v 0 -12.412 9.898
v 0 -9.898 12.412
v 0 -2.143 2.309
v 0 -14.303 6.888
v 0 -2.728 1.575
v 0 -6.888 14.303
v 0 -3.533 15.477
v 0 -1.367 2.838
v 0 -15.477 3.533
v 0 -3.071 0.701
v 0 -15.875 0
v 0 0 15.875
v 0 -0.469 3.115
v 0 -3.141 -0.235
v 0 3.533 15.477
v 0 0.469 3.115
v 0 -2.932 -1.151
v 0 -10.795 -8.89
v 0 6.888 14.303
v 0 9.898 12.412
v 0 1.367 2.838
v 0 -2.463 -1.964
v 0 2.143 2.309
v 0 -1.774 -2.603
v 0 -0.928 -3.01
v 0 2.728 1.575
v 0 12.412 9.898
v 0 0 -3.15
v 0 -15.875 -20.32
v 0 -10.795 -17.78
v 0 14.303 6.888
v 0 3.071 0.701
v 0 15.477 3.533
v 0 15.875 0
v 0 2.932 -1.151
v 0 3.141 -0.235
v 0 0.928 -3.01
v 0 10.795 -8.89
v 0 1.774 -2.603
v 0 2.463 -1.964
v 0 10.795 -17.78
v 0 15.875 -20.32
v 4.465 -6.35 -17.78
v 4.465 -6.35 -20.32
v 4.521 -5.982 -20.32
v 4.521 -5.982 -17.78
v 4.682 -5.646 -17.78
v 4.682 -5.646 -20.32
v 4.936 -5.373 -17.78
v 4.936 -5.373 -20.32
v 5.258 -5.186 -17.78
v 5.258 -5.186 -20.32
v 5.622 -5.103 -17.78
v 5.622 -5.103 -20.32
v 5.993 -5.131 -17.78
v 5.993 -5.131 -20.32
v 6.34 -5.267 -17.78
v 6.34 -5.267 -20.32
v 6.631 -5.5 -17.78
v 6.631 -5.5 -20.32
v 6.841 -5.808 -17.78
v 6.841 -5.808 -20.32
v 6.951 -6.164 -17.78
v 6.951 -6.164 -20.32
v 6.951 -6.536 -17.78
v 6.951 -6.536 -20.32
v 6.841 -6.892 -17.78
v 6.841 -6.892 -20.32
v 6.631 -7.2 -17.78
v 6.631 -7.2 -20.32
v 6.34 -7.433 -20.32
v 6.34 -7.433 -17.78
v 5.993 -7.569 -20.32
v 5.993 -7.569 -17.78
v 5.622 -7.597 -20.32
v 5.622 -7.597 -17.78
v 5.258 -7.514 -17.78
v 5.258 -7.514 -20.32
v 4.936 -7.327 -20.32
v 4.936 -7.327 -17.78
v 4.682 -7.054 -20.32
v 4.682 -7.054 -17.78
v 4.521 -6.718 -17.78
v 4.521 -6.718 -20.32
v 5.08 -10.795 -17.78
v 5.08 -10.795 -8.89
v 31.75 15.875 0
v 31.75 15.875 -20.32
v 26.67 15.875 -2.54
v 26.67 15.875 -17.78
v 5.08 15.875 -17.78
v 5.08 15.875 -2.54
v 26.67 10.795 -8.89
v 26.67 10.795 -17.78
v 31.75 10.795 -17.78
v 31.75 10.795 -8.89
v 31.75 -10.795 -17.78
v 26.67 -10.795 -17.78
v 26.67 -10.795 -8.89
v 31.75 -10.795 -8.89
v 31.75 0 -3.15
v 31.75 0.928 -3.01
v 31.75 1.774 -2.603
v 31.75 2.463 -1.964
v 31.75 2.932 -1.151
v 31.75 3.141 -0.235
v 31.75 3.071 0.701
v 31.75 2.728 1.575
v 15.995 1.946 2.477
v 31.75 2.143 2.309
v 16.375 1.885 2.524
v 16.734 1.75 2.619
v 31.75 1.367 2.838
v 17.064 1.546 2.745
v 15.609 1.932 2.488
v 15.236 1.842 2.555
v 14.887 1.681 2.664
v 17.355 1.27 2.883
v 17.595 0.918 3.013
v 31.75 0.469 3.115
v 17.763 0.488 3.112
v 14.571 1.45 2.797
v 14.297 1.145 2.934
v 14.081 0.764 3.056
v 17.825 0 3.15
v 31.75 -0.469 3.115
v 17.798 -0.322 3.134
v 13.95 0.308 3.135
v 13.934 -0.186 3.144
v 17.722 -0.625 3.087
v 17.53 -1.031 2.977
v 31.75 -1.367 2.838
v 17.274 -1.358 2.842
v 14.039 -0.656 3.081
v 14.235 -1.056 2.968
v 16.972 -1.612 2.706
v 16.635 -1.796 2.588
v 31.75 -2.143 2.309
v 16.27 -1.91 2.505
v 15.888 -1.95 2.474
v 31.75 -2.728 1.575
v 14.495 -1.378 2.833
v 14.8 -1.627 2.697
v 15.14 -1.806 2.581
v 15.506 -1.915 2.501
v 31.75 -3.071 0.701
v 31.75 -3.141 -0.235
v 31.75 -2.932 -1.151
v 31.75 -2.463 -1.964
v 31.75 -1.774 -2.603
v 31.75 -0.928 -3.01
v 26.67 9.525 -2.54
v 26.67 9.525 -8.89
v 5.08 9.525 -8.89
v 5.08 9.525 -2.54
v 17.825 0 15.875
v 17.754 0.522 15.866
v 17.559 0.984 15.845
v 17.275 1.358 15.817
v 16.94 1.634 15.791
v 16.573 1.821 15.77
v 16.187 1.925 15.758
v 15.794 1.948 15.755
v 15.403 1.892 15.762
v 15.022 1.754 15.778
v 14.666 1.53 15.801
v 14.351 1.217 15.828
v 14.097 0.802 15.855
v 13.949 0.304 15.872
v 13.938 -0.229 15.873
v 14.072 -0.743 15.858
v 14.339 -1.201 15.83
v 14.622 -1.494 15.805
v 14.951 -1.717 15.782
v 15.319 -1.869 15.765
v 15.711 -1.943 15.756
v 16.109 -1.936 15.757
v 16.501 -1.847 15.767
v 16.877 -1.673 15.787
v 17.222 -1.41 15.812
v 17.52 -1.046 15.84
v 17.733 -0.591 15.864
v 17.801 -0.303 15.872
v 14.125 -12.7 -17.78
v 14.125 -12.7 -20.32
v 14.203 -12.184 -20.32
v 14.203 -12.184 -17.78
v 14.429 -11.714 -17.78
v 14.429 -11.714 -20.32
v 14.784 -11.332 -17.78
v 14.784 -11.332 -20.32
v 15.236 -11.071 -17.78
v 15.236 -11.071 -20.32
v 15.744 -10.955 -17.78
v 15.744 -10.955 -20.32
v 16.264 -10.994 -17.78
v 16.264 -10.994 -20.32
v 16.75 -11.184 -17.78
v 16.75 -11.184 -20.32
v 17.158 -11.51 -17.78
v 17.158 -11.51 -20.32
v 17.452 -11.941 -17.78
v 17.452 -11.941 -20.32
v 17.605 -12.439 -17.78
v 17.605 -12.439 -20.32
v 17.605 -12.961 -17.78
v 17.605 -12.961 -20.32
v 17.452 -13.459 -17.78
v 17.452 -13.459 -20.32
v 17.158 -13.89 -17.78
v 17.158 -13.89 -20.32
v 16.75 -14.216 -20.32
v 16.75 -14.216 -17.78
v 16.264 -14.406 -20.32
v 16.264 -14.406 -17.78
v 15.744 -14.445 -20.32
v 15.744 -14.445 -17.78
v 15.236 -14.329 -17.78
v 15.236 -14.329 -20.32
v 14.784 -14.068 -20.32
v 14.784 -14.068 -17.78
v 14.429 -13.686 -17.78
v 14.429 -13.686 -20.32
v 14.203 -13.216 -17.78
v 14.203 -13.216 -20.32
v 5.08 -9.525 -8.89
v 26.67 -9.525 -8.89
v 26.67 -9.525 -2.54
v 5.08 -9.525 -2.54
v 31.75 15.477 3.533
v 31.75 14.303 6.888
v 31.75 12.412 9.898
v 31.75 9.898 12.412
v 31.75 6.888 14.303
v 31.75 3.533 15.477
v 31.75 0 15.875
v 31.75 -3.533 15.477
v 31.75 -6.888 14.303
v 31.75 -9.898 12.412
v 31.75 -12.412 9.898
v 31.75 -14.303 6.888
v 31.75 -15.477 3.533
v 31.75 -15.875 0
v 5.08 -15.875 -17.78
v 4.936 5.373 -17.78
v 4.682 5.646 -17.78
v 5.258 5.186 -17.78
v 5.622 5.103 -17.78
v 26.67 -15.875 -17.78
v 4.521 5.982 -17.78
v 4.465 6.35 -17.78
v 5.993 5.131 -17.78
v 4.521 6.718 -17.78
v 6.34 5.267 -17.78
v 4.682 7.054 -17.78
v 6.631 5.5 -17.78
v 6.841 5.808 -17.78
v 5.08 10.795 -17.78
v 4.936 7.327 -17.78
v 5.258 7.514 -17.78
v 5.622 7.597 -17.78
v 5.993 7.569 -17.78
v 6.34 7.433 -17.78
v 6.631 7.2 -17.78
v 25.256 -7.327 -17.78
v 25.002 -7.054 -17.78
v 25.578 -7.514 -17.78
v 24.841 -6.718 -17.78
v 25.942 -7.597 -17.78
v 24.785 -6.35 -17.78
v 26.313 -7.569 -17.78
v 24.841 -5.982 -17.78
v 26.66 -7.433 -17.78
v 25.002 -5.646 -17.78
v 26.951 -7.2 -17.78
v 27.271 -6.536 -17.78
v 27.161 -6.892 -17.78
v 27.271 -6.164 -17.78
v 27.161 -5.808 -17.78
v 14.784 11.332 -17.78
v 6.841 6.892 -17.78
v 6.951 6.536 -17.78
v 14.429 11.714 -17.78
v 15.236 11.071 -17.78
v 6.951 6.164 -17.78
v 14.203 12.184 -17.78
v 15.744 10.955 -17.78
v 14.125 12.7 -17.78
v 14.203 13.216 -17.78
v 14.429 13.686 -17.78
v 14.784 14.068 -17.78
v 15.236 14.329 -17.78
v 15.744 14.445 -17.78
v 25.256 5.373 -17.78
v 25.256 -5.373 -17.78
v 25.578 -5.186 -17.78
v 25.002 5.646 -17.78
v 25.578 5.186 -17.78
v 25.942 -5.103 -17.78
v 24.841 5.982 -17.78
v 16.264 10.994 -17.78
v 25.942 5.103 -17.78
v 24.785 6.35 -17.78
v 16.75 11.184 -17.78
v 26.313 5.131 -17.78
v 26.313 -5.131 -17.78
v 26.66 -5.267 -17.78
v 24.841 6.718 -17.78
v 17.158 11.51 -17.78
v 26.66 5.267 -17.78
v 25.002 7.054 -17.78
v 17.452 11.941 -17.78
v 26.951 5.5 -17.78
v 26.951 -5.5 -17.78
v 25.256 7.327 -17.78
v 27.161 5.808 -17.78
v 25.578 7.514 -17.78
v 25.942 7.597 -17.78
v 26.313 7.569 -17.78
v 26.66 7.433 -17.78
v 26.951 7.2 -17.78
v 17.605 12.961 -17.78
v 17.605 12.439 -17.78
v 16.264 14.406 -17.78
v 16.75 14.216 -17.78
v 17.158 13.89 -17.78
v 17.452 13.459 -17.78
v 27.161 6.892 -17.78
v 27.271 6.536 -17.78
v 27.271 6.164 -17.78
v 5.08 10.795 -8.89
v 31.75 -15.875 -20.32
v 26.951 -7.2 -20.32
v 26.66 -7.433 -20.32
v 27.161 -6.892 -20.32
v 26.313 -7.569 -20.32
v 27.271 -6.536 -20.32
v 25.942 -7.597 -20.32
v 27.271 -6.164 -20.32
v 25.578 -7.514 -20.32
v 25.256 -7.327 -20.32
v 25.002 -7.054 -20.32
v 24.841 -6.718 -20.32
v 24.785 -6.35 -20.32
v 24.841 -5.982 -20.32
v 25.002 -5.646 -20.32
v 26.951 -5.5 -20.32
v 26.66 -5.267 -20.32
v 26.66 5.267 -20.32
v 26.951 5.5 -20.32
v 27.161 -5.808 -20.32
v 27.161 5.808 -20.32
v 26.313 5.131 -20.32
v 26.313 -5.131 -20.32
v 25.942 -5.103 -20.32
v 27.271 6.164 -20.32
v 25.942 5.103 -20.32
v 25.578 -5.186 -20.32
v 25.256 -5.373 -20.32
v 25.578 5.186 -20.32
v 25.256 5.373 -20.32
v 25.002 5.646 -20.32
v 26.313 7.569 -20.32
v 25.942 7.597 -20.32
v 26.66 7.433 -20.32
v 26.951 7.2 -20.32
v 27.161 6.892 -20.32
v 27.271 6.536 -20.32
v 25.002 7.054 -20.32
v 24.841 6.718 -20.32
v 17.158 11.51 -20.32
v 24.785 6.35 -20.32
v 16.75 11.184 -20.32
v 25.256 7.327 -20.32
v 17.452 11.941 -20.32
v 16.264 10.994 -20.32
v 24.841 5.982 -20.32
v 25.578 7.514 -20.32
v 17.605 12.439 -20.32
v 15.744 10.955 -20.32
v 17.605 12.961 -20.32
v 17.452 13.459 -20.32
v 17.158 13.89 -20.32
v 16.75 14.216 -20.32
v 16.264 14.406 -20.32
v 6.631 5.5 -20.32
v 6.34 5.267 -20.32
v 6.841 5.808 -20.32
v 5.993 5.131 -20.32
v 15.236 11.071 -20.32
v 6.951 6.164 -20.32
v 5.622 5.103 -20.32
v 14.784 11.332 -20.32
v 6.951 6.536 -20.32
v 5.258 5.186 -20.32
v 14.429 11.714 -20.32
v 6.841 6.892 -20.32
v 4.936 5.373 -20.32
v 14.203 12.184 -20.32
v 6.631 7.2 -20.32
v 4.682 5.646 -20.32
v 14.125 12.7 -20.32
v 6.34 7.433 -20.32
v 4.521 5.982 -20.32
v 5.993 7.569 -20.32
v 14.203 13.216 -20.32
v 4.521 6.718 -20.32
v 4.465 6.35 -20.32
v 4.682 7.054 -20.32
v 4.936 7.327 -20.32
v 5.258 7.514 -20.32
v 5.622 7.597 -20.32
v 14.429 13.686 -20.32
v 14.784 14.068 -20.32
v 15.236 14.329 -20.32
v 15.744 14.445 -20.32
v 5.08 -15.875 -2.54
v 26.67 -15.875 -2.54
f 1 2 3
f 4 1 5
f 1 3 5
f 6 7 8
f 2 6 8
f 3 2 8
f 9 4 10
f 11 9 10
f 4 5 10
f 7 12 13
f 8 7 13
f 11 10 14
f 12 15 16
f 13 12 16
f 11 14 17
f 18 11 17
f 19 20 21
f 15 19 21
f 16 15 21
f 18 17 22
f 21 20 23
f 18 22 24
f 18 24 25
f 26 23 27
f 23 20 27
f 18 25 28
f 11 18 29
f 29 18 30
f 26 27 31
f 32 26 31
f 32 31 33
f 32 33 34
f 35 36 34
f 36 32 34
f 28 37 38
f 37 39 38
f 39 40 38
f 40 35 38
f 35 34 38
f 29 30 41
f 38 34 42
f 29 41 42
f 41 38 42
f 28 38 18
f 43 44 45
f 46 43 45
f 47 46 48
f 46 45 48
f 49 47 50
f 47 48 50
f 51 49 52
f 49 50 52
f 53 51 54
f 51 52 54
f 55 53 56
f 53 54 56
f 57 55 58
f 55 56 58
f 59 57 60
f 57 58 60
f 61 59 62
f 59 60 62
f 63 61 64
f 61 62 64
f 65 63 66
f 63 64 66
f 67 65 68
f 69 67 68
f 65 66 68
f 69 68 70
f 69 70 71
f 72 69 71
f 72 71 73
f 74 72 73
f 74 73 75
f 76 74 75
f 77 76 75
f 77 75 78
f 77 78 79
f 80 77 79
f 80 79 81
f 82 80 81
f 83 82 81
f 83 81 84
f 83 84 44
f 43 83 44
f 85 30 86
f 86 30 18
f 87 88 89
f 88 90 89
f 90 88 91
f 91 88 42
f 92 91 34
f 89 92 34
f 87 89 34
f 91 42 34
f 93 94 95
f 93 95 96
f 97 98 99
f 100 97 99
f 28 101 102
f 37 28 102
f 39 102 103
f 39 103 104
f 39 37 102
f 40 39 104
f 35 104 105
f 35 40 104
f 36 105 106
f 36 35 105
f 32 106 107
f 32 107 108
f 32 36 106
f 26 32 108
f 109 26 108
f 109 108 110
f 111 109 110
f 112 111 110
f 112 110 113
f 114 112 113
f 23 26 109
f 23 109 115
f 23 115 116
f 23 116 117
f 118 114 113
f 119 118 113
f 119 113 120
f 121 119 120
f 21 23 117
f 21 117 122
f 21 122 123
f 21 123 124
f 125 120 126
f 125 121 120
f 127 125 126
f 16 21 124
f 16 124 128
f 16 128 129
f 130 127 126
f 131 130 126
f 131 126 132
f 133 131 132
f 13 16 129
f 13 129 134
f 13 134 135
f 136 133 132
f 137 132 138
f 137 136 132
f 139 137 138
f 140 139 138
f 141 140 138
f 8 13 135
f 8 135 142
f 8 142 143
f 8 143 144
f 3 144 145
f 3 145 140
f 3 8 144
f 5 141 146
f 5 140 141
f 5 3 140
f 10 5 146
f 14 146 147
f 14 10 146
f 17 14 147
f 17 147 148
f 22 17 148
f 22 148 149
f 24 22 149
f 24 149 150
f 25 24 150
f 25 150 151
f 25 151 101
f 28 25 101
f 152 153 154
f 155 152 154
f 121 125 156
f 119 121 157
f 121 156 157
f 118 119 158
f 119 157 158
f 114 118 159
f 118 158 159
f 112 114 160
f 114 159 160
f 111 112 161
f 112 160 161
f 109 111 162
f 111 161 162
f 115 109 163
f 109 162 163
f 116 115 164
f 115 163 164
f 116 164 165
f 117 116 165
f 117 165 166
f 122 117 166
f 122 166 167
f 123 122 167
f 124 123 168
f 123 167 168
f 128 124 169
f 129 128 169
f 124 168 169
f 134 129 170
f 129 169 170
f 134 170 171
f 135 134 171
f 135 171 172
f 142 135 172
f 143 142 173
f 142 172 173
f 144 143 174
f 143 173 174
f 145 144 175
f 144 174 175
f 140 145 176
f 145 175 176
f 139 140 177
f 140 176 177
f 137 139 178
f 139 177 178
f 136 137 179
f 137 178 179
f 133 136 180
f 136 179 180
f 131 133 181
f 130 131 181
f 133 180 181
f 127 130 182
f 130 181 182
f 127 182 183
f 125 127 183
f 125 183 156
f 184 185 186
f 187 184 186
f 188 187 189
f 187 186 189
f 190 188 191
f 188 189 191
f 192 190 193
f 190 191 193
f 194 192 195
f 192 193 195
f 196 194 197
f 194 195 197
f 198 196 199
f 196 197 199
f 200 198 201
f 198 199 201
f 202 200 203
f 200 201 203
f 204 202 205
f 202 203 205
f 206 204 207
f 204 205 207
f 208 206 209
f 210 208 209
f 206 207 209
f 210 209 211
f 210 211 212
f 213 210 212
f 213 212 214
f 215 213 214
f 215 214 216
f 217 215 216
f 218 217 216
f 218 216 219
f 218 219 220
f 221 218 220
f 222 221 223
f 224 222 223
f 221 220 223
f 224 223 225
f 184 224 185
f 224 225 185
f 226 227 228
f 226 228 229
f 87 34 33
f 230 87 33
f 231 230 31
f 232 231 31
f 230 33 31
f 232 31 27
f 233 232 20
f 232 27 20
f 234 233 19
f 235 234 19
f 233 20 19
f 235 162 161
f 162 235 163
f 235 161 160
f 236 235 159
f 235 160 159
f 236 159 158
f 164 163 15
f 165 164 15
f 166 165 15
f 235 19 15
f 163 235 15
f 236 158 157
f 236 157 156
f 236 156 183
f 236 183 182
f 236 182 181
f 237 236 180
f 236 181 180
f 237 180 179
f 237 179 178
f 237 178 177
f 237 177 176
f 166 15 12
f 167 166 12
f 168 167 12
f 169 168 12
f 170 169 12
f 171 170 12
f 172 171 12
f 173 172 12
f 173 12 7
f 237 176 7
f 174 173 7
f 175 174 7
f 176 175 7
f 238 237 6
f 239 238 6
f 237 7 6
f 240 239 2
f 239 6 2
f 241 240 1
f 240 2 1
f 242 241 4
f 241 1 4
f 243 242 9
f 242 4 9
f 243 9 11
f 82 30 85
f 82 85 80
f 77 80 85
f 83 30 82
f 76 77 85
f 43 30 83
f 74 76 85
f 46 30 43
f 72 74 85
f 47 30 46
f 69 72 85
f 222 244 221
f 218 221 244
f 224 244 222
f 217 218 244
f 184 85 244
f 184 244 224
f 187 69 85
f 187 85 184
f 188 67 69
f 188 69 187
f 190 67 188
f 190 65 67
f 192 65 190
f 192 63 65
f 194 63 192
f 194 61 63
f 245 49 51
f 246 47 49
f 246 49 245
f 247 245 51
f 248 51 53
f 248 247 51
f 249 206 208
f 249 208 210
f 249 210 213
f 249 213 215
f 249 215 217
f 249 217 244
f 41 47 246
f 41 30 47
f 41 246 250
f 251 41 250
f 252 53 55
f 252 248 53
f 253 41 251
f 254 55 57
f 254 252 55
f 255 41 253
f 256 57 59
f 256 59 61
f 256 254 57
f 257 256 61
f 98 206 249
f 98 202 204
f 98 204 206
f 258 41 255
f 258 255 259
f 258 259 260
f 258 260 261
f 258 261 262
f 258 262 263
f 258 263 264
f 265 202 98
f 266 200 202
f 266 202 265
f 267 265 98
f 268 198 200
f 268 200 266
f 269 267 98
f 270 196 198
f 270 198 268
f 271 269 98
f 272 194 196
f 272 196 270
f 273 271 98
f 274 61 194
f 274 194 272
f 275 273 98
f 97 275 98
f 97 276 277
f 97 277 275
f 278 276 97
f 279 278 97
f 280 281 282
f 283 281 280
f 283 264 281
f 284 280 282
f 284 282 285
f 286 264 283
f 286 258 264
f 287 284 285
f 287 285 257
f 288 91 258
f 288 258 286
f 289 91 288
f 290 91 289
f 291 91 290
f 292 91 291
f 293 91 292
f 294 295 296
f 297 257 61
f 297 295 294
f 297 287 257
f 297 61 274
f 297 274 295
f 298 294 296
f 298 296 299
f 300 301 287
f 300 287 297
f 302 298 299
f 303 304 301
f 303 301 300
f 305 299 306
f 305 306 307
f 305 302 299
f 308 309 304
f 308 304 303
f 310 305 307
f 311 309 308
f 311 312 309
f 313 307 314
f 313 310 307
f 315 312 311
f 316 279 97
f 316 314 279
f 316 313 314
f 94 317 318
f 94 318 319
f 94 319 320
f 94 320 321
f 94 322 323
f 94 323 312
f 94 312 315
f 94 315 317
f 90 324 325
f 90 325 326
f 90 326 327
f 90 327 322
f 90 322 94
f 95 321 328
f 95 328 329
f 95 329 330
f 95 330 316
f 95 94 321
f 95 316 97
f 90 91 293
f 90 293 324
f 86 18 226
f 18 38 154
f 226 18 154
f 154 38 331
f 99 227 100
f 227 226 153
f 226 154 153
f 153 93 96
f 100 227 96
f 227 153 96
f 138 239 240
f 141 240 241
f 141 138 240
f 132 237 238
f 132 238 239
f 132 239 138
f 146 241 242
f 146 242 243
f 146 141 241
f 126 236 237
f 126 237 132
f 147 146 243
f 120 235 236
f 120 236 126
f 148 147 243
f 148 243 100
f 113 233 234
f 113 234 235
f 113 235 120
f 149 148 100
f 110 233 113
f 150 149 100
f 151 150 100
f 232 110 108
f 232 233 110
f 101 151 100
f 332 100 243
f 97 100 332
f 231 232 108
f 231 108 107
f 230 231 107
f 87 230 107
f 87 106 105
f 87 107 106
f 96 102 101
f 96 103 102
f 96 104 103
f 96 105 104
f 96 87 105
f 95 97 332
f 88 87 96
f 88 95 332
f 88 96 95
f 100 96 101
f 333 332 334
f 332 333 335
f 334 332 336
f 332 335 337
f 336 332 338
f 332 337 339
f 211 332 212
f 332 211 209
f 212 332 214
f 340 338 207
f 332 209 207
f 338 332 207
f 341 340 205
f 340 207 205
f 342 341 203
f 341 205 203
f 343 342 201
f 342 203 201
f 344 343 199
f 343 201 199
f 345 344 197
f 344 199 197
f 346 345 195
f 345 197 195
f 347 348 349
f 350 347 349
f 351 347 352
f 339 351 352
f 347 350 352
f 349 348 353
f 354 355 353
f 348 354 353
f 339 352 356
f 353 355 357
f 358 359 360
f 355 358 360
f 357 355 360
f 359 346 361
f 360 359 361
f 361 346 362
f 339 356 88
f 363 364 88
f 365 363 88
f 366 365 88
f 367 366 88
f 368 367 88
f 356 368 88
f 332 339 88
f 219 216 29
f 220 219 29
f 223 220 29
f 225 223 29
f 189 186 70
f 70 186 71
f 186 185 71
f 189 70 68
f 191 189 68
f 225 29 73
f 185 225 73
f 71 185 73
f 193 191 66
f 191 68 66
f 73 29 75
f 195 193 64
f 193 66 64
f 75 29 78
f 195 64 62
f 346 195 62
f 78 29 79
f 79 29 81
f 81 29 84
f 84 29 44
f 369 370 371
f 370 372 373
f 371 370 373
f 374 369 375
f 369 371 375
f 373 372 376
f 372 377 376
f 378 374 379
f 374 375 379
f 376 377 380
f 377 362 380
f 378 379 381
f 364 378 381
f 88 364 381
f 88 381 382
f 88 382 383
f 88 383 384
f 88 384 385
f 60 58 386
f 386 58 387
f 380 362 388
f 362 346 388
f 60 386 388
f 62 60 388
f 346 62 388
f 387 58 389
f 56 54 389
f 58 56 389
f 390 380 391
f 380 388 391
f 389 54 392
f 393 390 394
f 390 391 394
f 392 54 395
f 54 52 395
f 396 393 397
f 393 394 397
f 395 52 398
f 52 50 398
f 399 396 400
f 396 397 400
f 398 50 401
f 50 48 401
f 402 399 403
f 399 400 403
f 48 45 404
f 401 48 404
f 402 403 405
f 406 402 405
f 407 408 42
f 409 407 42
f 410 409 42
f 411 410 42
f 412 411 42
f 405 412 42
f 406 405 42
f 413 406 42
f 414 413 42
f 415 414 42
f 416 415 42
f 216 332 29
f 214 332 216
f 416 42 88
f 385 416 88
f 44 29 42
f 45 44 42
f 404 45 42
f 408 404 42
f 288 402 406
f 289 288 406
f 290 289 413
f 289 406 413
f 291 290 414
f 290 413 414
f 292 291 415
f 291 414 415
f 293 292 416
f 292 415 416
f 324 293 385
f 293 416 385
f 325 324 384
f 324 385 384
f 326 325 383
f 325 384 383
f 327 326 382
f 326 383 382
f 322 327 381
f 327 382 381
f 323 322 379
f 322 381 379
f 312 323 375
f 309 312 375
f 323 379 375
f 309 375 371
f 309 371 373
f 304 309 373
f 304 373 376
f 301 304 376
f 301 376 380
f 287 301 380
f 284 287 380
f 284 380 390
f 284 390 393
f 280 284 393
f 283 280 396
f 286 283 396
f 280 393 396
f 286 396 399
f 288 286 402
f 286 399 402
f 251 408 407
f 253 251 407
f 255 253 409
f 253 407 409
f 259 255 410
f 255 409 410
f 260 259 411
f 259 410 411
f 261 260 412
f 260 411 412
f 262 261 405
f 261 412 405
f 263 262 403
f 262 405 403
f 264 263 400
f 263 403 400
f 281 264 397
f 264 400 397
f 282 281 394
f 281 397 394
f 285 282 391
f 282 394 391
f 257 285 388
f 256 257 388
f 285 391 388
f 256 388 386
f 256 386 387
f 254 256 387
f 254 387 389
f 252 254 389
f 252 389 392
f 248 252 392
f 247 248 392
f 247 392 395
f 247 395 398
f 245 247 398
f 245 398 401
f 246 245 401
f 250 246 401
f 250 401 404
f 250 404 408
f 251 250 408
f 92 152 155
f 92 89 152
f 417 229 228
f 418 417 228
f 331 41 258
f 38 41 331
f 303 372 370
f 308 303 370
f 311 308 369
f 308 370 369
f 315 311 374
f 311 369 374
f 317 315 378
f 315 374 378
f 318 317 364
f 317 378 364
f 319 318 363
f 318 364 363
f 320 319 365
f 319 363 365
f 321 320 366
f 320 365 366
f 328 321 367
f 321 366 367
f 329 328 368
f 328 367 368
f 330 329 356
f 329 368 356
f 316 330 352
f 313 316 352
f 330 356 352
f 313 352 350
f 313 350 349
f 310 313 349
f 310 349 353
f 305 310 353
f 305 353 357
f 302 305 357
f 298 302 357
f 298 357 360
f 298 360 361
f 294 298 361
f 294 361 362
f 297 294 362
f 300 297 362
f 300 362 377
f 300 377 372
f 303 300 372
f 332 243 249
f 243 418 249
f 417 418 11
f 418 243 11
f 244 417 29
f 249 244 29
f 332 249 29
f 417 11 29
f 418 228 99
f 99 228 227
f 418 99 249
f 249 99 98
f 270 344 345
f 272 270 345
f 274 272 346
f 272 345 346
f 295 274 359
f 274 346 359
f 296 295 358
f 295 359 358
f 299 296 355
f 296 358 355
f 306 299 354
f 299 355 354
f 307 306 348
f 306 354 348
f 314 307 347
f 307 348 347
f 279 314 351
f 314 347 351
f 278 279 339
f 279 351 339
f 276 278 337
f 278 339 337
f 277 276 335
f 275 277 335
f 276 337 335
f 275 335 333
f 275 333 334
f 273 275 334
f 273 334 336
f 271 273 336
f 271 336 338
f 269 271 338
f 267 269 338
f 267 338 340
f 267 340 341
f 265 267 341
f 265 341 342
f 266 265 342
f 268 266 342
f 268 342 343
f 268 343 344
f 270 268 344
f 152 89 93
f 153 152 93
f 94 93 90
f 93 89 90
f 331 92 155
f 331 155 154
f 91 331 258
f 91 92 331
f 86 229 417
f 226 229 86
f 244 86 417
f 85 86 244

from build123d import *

# Parameters (mm, degrees)
SKETCH1_R               = 3.15
BOSS_EXTRUDE1_DEPTH     = 31.75
SKETCH4_W               = 8.89
SKETCH4_H               = 21.59
CUT_EXTRUDE1_DEPTH      = 41.902084605
SKETCH2_R               = 1.25
CUT_EXTRUDE2_DEPTH      = 2.54
SKETCH5_W               = 21.59
SKETCH5_H               = 8.89
CUT_EXTRUDE3_DEPTH      = 50.285164096
SKETCH6_R               = 1.75
CUT_EXTRUDE4_DEPTH      = 2.54
CUT_EXTRUDE5_REACH      = 81.487
CUT_EXTRUDE5_END_RADIUS = 3.15
SKETCH7_R               = 1.95
CUT_EXTRUDE6_DEPTH      = 6.35


with BuildPart() as part:
    # Sketch1 → Boss-Extrude1 (new body)
    with BuildSketch(Plane(origin=(0, 0, 0), x_dir=(0, 0, -1), z_dir=(1, 0, 0))):
        with BuildLine():
            Line((20.32, 15.875), (0, 15.875))
            ThreePointArc((0, 15.875), (-15.875, 0), (0, -15.875))
            Line((0, -15.875), (20.32, -15.875))
            Line((20.32, -15.875), (20.32, 15.875))
        make_face()
        Circle(SKETCH1_R, mode=Mode.SUBTRACT)
    extrude(amount=BOSS_EXTRUDE1_DEPTH)

    # Sketch4 → Cut-Extrude1 (cut, through all)
    with BuildSketch(Plane.ZY):
        with Locations((-13.335, 0)):
            Rectangle(SKETCH4_W, SKETCH4_H)
    extrude(amount=-CUT_EXTRUDE1_DEPTH, mode=Mode.SUBTRACT)

    # Sketch2 → Cut-Extrude2 (cut)
    with BuildSketch(Plane(origin=(0, 0, -20.32), x_dir=(-1, 0, 0), z_dir=(0, 0, -1))):
        with Locations((-26.035, 6.35)):
            Circle(SKETCH2_R)
        with Locations((-5.715, 6.35)):
            Circle(SKETCH2_R)
        with Locations((-5.715, -6.35)):
            Circle(SKETCH2_R)
        with Locations((-26.035, -6.35)):
            Circle(SKETCH2_R)
    extrude(amount=-CUT_EXTRUDE2_DEPTH, mode=Mode.SUBTRACT)

    # Sketch5 → Cut-Extrude3 (cut, through all)
    with BuildSketch(Plane(origin=(0, 15.875, 0), x_dir=(1, 0, 0), z_dir=(0, 1, 0))):
        with Locations((15.875, 13.335)):
            Rectangle(SKETCH5_W, SKETCH5_H)
    extrude(amount=-CUT_EXTRUDE3_DEPTH, mode=Mode.SUBTRACT)

    # Sketch6 → Cut-Extrude4 (cut)
    with BuildSketch(Plane(origin=(0, 0, -20.32), x_dir=(-1, 0, 0), z_dir=(0, 0, -1))):
        with Locations((-15.875, 12.7)):
            Circle(SKETCH6_R)
        with Locations((-15.875, -12.7)):
            Circle(SKETCH6_R)
    extrude(amount=-CUT_EXTRUDE4_DEPTH, mode=Mode.SUBTRACT)

    # Cut-Extrude5: up to this cylinder (the profile starts outside it)
    cut_extrude5_end = Plane(origin=(15.875, 0, 0), z_dir=(-1, 0, 0)) * Cylinder(CUT_EXTRUDE5_END_RADIUS, 170.274, mode=Mode.PRIVATE)
    # Sketch7 → Cut-Extrude5 (cut, up to the surface)
    with BuildSketch(Plane.XY.offset(50.8), mode=Mode.PRIVATE) as cut_extrude5_sk1:
        with Locations((15.875, 0)):
            Circle(SKETCH7_R)
    cut_extrude5_tool1 = extrude(cut_extrude5_sk1.sketch, amount=-CUT_EXTRUDE5_REACH, mode=Mode.PRIVATE) - cut_extrude5_end
    add(cut_extrude5_tool1.solids().sort_by_distance((15.875, 0, 50.8))[0], mode=Mode.SUBTRACT)

    # Sketch8 → Cut-Extrude6 (cut)
    with BuildSketch(Plane(origin=(0, 0, -8.89), x_dir=(-1, 0, 0), z_dir=(0, 0, -1))):
        Polygon((-26.67, 9.525), (-5.08, 9.525), (-5.08, 10.795), (-5.08, 15.875), (-26.67, 15.875), (-26.67, 10.795), align=None)
        Polygon((-26.67, -9.525), (-5.08, -9.525), (-5.08, -10.795), (-5.08, -15.875), (-26.67, -15.875), (-26.67, -10.795), align=None)
    extrude(amount=-CUT_EXTRUDE6_DEPTH, mode=Mode.SUBTRACT)


solid = part.part
